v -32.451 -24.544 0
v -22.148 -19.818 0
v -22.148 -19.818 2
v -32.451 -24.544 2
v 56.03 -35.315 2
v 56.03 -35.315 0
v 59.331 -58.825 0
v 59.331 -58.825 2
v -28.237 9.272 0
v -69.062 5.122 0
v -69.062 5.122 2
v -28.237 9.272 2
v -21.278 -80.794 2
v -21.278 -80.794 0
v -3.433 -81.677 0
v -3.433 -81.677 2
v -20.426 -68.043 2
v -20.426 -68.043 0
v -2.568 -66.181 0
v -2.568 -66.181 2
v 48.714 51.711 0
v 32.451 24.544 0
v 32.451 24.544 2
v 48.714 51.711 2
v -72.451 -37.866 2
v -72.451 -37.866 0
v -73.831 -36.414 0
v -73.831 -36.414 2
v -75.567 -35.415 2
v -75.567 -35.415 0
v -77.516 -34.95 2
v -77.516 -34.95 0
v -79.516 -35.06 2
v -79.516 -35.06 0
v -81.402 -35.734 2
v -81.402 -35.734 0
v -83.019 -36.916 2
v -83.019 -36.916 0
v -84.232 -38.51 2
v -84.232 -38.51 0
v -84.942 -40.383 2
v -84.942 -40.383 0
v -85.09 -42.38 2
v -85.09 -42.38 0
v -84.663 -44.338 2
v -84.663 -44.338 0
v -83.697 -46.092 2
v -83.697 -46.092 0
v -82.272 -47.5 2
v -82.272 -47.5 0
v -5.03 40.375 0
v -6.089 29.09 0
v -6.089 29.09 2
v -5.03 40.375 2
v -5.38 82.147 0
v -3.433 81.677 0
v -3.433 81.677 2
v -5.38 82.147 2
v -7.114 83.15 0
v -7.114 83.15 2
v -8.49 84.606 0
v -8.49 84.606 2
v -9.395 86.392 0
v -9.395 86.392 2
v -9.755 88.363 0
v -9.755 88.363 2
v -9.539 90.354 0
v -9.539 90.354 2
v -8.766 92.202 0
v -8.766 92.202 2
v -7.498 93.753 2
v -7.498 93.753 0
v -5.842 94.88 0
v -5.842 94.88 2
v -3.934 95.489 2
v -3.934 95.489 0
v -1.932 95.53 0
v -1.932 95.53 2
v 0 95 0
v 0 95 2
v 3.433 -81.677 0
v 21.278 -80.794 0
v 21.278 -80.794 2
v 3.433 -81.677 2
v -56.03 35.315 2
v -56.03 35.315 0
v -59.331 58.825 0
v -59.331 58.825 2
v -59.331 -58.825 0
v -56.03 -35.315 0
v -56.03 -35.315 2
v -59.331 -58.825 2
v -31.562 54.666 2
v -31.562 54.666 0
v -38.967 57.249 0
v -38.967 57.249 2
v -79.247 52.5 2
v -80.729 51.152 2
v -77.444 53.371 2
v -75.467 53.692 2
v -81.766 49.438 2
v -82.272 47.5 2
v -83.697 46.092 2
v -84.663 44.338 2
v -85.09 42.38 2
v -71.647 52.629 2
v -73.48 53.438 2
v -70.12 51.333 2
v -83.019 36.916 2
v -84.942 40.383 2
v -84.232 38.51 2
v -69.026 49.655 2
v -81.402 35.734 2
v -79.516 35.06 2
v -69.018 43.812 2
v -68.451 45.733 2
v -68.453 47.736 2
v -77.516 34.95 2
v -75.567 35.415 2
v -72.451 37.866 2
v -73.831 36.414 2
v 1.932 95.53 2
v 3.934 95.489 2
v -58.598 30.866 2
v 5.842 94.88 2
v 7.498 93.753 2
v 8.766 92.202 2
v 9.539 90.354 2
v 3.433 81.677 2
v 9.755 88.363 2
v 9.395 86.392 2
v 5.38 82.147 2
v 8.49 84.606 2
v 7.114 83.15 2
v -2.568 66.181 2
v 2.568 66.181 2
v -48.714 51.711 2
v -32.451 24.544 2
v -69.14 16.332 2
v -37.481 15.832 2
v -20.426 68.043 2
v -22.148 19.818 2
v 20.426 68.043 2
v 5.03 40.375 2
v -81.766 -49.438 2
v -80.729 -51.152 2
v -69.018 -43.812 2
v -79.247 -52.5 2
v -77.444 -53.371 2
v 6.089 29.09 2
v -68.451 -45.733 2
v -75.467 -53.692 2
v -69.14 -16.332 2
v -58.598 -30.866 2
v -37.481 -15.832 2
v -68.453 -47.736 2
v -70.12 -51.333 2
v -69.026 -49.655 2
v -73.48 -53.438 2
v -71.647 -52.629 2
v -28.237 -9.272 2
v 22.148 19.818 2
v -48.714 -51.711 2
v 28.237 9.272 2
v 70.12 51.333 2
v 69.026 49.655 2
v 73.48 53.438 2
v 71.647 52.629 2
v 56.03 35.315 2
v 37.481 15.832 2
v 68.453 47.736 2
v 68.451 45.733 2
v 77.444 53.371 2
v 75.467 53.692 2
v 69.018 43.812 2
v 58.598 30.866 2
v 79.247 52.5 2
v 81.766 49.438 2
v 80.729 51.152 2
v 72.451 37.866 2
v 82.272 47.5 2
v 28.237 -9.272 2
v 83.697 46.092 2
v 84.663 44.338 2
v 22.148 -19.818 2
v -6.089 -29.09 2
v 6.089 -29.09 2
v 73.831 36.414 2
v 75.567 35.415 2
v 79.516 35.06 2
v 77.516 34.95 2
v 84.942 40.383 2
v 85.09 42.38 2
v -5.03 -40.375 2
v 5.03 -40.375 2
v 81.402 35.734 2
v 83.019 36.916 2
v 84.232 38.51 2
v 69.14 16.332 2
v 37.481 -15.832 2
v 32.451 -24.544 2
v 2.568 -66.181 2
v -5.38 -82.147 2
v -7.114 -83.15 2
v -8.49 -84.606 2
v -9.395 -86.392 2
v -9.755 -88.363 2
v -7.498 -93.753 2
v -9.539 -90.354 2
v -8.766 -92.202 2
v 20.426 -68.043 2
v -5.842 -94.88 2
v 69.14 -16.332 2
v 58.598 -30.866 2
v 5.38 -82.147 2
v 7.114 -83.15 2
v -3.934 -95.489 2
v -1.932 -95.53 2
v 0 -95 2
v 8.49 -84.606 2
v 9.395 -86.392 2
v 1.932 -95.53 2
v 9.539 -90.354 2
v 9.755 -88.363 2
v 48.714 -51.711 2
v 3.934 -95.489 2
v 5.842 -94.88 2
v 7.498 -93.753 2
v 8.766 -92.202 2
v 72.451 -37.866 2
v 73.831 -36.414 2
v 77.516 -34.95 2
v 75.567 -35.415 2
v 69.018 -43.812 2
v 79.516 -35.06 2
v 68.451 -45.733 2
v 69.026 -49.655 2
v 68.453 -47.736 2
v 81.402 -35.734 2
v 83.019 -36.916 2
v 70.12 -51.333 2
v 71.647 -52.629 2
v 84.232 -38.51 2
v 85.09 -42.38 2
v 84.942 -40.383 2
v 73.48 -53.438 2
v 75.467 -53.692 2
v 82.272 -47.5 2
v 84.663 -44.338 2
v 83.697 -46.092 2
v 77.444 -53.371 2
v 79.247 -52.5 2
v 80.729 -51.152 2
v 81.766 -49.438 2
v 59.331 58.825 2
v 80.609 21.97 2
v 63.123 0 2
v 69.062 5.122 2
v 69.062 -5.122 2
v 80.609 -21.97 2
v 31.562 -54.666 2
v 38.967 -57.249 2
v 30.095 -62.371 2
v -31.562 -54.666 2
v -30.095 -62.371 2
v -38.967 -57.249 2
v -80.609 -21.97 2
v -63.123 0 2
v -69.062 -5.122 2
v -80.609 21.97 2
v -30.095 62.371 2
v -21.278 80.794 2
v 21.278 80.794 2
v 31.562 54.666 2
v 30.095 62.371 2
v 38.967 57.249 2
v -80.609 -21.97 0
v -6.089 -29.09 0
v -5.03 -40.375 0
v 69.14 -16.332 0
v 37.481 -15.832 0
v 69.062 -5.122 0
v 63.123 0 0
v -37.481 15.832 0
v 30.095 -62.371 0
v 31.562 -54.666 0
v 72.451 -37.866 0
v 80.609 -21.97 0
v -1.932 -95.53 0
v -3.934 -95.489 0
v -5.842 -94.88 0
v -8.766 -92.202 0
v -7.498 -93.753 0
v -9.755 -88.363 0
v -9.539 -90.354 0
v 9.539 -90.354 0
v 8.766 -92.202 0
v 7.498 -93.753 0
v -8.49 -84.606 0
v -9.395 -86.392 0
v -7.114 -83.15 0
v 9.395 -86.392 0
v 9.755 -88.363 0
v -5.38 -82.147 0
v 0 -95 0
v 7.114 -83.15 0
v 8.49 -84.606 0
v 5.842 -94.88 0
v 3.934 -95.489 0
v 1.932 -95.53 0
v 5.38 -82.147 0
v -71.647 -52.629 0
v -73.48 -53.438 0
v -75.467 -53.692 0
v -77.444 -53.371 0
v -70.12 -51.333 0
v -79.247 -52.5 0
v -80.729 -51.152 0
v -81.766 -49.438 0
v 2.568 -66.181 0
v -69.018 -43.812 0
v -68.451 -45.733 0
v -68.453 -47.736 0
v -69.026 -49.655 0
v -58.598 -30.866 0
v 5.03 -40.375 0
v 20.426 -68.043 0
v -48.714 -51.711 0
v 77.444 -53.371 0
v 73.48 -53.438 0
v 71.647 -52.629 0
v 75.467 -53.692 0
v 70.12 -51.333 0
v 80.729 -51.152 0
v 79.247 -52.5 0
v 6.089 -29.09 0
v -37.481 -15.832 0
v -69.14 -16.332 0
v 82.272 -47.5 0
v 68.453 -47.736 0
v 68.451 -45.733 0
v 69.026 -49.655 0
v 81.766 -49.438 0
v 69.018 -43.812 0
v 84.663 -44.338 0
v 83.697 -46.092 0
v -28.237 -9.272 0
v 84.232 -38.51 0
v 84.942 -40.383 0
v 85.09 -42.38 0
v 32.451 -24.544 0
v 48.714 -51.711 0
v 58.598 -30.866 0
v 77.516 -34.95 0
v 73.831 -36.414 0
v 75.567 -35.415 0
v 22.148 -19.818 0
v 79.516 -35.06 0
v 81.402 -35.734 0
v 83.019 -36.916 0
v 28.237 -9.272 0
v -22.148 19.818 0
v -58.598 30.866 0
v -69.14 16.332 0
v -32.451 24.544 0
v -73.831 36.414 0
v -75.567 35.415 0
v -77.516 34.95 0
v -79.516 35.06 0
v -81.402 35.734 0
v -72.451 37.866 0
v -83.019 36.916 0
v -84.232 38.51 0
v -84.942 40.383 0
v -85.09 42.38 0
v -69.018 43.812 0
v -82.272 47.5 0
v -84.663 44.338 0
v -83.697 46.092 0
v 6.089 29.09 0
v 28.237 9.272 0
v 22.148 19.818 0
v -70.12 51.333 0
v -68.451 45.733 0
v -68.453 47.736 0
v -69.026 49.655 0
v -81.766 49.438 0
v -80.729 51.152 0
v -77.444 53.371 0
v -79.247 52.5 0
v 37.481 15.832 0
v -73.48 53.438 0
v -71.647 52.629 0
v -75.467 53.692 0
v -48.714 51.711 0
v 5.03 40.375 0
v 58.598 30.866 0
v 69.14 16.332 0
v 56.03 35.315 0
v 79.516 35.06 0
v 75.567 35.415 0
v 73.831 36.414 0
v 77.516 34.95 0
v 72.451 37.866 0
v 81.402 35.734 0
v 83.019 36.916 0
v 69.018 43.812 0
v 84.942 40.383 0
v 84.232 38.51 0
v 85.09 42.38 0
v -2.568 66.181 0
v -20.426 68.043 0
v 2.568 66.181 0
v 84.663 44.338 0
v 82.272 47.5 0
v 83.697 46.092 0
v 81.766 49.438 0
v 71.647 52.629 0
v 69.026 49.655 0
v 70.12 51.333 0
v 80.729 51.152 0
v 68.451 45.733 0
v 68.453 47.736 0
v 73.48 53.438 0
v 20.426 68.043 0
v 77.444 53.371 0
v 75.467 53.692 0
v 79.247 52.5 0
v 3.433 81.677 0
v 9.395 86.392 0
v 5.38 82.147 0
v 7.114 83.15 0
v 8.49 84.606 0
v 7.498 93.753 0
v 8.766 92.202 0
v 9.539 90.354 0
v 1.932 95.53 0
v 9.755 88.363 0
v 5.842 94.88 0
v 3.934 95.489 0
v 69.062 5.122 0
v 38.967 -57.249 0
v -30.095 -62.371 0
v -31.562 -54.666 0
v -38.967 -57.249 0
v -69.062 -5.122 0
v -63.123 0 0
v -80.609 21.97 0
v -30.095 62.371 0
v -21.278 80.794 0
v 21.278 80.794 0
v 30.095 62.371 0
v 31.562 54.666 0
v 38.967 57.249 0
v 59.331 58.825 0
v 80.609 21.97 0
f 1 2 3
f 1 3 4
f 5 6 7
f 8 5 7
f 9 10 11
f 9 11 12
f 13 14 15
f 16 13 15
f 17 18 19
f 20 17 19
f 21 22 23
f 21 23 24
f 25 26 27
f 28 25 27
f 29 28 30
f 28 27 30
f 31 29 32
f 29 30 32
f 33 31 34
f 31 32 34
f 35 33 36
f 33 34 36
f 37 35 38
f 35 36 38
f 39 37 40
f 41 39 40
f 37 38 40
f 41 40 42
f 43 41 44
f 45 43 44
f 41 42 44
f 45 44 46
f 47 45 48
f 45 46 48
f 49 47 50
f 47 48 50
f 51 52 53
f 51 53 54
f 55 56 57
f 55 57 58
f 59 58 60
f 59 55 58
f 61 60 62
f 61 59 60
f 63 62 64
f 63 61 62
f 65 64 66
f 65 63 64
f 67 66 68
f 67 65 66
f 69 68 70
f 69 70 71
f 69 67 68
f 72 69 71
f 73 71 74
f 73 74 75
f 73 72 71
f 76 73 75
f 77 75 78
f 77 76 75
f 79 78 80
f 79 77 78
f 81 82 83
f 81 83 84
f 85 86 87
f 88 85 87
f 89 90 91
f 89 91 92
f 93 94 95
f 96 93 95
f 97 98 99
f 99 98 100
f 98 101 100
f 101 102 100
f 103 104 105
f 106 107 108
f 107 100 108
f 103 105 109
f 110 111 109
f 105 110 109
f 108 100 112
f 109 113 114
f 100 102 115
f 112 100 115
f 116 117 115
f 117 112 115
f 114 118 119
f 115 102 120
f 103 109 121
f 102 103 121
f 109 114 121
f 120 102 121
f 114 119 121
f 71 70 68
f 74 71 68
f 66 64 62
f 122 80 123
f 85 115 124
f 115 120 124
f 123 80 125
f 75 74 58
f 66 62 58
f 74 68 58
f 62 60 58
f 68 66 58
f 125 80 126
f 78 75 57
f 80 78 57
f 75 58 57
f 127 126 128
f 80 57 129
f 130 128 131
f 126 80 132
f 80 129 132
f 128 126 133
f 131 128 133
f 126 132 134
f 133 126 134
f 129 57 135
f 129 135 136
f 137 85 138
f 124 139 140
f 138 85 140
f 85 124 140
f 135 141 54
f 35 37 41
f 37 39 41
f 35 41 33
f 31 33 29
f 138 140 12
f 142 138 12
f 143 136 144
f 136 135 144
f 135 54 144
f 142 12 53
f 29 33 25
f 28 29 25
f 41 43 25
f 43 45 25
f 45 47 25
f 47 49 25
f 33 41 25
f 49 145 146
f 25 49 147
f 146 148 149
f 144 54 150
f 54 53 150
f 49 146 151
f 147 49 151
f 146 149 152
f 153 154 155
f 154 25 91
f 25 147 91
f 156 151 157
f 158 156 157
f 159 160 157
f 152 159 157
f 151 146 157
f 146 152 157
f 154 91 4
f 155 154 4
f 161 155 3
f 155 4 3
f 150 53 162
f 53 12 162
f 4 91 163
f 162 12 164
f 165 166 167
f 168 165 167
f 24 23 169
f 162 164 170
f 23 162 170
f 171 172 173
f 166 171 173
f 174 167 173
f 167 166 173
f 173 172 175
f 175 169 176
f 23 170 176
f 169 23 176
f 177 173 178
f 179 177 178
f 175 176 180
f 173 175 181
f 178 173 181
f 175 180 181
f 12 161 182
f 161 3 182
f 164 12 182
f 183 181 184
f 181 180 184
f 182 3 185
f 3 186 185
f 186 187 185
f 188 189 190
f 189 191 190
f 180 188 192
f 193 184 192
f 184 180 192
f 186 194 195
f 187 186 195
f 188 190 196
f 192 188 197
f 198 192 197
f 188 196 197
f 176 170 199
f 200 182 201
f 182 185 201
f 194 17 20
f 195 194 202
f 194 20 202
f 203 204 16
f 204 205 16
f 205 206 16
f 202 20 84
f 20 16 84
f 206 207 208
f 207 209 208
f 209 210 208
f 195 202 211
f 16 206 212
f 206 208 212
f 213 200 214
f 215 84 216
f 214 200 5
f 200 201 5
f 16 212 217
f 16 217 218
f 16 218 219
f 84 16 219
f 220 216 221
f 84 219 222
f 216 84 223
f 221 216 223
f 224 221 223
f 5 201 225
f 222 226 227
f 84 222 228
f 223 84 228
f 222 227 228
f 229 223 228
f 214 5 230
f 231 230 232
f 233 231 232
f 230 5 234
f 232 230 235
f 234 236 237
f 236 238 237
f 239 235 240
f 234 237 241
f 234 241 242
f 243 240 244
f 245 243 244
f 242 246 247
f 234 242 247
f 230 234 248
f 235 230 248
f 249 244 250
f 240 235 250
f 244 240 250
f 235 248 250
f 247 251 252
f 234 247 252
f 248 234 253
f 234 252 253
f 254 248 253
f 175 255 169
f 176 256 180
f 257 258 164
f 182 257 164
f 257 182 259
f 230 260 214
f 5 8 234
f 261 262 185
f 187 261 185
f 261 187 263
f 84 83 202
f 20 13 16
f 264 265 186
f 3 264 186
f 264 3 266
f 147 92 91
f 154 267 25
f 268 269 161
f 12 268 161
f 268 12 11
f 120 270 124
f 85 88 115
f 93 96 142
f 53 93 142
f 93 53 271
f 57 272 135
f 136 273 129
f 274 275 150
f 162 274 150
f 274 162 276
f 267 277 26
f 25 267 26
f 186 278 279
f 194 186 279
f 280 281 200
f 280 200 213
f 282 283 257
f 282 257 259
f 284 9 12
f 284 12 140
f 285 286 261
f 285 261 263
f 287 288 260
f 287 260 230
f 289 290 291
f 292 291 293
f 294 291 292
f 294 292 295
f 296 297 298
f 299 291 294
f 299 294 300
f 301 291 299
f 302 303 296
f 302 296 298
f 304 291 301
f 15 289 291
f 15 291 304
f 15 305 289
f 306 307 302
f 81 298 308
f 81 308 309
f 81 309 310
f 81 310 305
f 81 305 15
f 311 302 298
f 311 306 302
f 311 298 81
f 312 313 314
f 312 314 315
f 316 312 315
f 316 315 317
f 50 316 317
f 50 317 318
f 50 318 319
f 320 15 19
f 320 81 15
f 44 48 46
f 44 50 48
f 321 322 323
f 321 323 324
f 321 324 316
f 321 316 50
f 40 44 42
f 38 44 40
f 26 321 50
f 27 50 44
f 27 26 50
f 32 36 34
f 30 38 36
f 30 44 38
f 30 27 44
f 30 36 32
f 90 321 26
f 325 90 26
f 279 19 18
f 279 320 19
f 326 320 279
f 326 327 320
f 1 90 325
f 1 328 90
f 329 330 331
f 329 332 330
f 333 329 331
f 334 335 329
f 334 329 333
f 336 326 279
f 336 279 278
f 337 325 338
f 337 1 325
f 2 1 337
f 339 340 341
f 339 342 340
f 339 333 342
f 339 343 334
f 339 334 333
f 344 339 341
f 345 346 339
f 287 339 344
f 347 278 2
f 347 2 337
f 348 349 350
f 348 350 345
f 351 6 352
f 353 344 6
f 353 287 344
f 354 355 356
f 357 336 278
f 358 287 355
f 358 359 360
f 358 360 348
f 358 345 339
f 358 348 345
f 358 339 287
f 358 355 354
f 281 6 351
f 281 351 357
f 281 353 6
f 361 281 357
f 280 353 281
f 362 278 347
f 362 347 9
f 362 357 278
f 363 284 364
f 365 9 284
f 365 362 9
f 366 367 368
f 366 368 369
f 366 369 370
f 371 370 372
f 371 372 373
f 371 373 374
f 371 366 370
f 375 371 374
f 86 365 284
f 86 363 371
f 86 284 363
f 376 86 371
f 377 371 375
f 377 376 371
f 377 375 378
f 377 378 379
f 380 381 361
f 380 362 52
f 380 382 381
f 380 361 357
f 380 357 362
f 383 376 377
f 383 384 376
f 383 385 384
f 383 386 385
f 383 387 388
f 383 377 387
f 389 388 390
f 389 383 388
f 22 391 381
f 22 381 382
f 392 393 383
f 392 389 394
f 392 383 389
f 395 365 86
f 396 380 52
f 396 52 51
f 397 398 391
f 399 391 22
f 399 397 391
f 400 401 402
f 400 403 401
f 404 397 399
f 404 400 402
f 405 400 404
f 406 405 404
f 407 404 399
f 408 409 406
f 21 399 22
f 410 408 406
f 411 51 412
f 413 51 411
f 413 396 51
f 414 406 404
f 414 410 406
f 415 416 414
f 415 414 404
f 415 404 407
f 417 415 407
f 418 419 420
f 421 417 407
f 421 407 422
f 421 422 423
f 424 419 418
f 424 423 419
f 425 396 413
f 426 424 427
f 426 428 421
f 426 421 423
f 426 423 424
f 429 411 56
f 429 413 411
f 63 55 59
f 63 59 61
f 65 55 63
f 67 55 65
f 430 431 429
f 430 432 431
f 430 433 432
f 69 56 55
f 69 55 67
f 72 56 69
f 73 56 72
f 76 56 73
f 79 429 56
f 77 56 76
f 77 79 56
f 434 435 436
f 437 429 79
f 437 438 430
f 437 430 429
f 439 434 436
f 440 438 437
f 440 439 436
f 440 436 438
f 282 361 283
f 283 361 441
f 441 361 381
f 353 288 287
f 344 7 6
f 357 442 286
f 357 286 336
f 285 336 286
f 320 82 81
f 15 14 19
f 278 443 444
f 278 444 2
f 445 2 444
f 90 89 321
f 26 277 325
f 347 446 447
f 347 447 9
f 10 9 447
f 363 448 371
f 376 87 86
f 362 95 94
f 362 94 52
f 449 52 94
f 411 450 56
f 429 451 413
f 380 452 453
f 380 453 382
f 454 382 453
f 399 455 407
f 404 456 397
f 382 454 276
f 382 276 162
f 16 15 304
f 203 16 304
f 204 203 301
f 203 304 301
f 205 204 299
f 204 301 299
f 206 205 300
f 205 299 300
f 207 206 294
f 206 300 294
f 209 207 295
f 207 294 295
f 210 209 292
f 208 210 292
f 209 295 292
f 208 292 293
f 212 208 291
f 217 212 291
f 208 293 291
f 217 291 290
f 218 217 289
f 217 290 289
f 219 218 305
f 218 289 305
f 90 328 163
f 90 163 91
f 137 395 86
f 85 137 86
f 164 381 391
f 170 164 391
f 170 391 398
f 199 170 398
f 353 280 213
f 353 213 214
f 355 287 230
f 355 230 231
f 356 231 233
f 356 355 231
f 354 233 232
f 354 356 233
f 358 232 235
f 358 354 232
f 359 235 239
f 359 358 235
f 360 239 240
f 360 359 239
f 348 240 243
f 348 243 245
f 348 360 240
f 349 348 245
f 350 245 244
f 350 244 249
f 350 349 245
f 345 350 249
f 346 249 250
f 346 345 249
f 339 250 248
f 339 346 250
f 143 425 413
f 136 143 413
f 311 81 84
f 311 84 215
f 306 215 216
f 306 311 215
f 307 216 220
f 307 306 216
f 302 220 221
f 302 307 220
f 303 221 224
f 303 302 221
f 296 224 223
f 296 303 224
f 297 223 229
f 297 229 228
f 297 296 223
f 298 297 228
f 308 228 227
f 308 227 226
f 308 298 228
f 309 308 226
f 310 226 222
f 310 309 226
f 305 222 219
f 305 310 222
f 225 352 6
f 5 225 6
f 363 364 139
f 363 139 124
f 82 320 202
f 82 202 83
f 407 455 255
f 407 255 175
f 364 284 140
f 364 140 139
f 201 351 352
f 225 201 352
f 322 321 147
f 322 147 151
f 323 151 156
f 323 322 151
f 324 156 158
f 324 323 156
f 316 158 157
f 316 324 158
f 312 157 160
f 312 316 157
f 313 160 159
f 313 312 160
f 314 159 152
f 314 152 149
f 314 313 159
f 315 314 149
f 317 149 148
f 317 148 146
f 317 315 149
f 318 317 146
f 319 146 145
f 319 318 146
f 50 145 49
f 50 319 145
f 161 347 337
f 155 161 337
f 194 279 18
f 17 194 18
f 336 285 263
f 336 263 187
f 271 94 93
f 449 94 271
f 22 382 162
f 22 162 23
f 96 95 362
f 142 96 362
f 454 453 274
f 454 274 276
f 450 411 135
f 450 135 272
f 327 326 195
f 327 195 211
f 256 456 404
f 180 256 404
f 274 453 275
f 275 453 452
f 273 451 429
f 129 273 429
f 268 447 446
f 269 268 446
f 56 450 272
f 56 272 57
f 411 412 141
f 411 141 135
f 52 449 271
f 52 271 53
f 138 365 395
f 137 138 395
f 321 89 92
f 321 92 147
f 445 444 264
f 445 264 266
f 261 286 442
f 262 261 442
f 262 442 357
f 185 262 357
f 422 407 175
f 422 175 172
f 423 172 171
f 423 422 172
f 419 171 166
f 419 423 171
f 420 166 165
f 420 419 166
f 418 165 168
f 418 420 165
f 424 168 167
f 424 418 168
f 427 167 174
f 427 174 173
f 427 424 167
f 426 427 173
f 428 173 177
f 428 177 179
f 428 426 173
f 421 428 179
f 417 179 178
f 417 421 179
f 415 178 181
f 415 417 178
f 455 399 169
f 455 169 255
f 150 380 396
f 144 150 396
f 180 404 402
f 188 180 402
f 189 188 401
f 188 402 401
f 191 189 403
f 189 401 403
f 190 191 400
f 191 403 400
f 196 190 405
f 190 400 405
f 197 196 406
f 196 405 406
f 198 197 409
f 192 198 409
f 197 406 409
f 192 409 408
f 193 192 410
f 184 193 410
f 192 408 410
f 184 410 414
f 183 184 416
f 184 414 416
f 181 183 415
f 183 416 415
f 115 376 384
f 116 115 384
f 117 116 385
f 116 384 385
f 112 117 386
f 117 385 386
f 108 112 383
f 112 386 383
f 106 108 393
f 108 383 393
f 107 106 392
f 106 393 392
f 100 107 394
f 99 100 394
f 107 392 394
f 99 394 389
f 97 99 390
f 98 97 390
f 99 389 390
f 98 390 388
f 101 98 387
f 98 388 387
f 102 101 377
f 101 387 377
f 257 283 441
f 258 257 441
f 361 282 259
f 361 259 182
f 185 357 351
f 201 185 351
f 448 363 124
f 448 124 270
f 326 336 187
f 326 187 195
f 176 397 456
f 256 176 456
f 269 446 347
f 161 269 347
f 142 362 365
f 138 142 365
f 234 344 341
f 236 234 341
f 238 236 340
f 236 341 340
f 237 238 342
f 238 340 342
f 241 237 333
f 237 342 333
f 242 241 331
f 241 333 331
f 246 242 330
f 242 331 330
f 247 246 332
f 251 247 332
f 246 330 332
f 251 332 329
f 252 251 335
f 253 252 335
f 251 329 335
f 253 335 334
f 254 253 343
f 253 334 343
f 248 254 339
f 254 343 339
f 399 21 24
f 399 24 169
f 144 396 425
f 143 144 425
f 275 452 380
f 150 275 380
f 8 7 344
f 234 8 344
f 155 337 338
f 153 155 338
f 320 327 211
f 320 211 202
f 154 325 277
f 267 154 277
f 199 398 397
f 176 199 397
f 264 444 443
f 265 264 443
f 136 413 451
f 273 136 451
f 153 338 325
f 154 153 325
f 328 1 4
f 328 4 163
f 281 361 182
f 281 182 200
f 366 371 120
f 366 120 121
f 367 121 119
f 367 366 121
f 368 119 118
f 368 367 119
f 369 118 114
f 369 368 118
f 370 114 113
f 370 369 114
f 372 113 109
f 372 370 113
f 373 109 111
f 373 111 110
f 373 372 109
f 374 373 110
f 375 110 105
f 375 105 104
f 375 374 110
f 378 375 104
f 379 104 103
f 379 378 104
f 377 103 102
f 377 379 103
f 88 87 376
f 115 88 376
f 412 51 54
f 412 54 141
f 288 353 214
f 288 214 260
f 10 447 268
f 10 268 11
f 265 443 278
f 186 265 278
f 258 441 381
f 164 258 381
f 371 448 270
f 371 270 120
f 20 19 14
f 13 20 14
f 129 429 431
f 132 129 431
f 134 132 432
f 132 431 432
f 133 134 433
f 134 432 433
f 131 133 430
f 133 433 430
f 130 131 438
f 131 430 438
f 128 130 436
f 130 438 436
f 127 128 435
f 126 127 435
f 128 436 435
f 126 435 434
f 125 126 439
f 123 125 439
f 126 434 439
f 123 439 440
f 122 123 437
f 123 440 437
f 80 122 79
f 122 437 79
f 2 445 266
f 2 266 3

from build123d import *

# Parameters (mm, degrees)
F1_DEPTH = 2
F4_COUNT = 6
F4_ANGLE = 300


with BuildPart() as f1:
    # F0 (on Top) → F1 (new body)
    with BuildSketch(Plane.XY):
        with BuildLine():
            Line((0, 95), (0, 82.2314136744))
            ThreePointArc((0, 82.2314136744), (1.6812792043, 81.736834508), (3.4327861377, 81.677405755))
            ThreePointArc((3.4327861377, 81.677405755), (9.5389305529, 90.3543086779), (0, 95))
        make_face()
        with BuildLine():
            ThreePointArc((3.4327861377, 81.677405755), (1.6812792043, 81.736834508), (0, 82.2314136744))
            Line((0, 82.2314136744), (0, 0))
            Line((0, 0), (5.8111646213, 0))
            Line((5.8111646213, 0), (32.2307050228, 51.1501394212))
            Line((32.2307050228, 51.1501394212), (30.095031485, 62.3711198568))
            Line((30.095031485, 62.3711198568), (6.0886708088, 29.0896948427))
            Line((6.0886708088, 29.0896948427), (5.0296979025, 40.3754748404))
            Line((5.0296979025, 40.3754748404), (20.4256810248, 68.0427178741))
            Line((20.4256810248, 68.0427178741), (2.5684384163, 66.1806464195))
            Line((2.5684384163, 66.1806464195), (21.2782546878, 80.7941183448))
            Line((21.2782546878, 80.7941183448), (3.4327861377, 81.677405755))
        make_face()
    extrude(amount=F1_DEPTH)

    # F2: F1 across plane


with BuildPart() as f1_1:
    add(f1.part)
    add(f1.part.mirror(Plane.YZ))

    # F4: F1 ×6 about axis
    f4_axis = Axis((0, 0, 4.1130185127), (0, 0, 1))


with BuildPart() as f1_2:
    add(f1_1.part)
    for i in range(1, F4_COUNT):
        add(f1_1.part.rotate(f4_axis, i * F4_ANGLE / (F4_COUNT - 1)))


solid = f1_2.part
